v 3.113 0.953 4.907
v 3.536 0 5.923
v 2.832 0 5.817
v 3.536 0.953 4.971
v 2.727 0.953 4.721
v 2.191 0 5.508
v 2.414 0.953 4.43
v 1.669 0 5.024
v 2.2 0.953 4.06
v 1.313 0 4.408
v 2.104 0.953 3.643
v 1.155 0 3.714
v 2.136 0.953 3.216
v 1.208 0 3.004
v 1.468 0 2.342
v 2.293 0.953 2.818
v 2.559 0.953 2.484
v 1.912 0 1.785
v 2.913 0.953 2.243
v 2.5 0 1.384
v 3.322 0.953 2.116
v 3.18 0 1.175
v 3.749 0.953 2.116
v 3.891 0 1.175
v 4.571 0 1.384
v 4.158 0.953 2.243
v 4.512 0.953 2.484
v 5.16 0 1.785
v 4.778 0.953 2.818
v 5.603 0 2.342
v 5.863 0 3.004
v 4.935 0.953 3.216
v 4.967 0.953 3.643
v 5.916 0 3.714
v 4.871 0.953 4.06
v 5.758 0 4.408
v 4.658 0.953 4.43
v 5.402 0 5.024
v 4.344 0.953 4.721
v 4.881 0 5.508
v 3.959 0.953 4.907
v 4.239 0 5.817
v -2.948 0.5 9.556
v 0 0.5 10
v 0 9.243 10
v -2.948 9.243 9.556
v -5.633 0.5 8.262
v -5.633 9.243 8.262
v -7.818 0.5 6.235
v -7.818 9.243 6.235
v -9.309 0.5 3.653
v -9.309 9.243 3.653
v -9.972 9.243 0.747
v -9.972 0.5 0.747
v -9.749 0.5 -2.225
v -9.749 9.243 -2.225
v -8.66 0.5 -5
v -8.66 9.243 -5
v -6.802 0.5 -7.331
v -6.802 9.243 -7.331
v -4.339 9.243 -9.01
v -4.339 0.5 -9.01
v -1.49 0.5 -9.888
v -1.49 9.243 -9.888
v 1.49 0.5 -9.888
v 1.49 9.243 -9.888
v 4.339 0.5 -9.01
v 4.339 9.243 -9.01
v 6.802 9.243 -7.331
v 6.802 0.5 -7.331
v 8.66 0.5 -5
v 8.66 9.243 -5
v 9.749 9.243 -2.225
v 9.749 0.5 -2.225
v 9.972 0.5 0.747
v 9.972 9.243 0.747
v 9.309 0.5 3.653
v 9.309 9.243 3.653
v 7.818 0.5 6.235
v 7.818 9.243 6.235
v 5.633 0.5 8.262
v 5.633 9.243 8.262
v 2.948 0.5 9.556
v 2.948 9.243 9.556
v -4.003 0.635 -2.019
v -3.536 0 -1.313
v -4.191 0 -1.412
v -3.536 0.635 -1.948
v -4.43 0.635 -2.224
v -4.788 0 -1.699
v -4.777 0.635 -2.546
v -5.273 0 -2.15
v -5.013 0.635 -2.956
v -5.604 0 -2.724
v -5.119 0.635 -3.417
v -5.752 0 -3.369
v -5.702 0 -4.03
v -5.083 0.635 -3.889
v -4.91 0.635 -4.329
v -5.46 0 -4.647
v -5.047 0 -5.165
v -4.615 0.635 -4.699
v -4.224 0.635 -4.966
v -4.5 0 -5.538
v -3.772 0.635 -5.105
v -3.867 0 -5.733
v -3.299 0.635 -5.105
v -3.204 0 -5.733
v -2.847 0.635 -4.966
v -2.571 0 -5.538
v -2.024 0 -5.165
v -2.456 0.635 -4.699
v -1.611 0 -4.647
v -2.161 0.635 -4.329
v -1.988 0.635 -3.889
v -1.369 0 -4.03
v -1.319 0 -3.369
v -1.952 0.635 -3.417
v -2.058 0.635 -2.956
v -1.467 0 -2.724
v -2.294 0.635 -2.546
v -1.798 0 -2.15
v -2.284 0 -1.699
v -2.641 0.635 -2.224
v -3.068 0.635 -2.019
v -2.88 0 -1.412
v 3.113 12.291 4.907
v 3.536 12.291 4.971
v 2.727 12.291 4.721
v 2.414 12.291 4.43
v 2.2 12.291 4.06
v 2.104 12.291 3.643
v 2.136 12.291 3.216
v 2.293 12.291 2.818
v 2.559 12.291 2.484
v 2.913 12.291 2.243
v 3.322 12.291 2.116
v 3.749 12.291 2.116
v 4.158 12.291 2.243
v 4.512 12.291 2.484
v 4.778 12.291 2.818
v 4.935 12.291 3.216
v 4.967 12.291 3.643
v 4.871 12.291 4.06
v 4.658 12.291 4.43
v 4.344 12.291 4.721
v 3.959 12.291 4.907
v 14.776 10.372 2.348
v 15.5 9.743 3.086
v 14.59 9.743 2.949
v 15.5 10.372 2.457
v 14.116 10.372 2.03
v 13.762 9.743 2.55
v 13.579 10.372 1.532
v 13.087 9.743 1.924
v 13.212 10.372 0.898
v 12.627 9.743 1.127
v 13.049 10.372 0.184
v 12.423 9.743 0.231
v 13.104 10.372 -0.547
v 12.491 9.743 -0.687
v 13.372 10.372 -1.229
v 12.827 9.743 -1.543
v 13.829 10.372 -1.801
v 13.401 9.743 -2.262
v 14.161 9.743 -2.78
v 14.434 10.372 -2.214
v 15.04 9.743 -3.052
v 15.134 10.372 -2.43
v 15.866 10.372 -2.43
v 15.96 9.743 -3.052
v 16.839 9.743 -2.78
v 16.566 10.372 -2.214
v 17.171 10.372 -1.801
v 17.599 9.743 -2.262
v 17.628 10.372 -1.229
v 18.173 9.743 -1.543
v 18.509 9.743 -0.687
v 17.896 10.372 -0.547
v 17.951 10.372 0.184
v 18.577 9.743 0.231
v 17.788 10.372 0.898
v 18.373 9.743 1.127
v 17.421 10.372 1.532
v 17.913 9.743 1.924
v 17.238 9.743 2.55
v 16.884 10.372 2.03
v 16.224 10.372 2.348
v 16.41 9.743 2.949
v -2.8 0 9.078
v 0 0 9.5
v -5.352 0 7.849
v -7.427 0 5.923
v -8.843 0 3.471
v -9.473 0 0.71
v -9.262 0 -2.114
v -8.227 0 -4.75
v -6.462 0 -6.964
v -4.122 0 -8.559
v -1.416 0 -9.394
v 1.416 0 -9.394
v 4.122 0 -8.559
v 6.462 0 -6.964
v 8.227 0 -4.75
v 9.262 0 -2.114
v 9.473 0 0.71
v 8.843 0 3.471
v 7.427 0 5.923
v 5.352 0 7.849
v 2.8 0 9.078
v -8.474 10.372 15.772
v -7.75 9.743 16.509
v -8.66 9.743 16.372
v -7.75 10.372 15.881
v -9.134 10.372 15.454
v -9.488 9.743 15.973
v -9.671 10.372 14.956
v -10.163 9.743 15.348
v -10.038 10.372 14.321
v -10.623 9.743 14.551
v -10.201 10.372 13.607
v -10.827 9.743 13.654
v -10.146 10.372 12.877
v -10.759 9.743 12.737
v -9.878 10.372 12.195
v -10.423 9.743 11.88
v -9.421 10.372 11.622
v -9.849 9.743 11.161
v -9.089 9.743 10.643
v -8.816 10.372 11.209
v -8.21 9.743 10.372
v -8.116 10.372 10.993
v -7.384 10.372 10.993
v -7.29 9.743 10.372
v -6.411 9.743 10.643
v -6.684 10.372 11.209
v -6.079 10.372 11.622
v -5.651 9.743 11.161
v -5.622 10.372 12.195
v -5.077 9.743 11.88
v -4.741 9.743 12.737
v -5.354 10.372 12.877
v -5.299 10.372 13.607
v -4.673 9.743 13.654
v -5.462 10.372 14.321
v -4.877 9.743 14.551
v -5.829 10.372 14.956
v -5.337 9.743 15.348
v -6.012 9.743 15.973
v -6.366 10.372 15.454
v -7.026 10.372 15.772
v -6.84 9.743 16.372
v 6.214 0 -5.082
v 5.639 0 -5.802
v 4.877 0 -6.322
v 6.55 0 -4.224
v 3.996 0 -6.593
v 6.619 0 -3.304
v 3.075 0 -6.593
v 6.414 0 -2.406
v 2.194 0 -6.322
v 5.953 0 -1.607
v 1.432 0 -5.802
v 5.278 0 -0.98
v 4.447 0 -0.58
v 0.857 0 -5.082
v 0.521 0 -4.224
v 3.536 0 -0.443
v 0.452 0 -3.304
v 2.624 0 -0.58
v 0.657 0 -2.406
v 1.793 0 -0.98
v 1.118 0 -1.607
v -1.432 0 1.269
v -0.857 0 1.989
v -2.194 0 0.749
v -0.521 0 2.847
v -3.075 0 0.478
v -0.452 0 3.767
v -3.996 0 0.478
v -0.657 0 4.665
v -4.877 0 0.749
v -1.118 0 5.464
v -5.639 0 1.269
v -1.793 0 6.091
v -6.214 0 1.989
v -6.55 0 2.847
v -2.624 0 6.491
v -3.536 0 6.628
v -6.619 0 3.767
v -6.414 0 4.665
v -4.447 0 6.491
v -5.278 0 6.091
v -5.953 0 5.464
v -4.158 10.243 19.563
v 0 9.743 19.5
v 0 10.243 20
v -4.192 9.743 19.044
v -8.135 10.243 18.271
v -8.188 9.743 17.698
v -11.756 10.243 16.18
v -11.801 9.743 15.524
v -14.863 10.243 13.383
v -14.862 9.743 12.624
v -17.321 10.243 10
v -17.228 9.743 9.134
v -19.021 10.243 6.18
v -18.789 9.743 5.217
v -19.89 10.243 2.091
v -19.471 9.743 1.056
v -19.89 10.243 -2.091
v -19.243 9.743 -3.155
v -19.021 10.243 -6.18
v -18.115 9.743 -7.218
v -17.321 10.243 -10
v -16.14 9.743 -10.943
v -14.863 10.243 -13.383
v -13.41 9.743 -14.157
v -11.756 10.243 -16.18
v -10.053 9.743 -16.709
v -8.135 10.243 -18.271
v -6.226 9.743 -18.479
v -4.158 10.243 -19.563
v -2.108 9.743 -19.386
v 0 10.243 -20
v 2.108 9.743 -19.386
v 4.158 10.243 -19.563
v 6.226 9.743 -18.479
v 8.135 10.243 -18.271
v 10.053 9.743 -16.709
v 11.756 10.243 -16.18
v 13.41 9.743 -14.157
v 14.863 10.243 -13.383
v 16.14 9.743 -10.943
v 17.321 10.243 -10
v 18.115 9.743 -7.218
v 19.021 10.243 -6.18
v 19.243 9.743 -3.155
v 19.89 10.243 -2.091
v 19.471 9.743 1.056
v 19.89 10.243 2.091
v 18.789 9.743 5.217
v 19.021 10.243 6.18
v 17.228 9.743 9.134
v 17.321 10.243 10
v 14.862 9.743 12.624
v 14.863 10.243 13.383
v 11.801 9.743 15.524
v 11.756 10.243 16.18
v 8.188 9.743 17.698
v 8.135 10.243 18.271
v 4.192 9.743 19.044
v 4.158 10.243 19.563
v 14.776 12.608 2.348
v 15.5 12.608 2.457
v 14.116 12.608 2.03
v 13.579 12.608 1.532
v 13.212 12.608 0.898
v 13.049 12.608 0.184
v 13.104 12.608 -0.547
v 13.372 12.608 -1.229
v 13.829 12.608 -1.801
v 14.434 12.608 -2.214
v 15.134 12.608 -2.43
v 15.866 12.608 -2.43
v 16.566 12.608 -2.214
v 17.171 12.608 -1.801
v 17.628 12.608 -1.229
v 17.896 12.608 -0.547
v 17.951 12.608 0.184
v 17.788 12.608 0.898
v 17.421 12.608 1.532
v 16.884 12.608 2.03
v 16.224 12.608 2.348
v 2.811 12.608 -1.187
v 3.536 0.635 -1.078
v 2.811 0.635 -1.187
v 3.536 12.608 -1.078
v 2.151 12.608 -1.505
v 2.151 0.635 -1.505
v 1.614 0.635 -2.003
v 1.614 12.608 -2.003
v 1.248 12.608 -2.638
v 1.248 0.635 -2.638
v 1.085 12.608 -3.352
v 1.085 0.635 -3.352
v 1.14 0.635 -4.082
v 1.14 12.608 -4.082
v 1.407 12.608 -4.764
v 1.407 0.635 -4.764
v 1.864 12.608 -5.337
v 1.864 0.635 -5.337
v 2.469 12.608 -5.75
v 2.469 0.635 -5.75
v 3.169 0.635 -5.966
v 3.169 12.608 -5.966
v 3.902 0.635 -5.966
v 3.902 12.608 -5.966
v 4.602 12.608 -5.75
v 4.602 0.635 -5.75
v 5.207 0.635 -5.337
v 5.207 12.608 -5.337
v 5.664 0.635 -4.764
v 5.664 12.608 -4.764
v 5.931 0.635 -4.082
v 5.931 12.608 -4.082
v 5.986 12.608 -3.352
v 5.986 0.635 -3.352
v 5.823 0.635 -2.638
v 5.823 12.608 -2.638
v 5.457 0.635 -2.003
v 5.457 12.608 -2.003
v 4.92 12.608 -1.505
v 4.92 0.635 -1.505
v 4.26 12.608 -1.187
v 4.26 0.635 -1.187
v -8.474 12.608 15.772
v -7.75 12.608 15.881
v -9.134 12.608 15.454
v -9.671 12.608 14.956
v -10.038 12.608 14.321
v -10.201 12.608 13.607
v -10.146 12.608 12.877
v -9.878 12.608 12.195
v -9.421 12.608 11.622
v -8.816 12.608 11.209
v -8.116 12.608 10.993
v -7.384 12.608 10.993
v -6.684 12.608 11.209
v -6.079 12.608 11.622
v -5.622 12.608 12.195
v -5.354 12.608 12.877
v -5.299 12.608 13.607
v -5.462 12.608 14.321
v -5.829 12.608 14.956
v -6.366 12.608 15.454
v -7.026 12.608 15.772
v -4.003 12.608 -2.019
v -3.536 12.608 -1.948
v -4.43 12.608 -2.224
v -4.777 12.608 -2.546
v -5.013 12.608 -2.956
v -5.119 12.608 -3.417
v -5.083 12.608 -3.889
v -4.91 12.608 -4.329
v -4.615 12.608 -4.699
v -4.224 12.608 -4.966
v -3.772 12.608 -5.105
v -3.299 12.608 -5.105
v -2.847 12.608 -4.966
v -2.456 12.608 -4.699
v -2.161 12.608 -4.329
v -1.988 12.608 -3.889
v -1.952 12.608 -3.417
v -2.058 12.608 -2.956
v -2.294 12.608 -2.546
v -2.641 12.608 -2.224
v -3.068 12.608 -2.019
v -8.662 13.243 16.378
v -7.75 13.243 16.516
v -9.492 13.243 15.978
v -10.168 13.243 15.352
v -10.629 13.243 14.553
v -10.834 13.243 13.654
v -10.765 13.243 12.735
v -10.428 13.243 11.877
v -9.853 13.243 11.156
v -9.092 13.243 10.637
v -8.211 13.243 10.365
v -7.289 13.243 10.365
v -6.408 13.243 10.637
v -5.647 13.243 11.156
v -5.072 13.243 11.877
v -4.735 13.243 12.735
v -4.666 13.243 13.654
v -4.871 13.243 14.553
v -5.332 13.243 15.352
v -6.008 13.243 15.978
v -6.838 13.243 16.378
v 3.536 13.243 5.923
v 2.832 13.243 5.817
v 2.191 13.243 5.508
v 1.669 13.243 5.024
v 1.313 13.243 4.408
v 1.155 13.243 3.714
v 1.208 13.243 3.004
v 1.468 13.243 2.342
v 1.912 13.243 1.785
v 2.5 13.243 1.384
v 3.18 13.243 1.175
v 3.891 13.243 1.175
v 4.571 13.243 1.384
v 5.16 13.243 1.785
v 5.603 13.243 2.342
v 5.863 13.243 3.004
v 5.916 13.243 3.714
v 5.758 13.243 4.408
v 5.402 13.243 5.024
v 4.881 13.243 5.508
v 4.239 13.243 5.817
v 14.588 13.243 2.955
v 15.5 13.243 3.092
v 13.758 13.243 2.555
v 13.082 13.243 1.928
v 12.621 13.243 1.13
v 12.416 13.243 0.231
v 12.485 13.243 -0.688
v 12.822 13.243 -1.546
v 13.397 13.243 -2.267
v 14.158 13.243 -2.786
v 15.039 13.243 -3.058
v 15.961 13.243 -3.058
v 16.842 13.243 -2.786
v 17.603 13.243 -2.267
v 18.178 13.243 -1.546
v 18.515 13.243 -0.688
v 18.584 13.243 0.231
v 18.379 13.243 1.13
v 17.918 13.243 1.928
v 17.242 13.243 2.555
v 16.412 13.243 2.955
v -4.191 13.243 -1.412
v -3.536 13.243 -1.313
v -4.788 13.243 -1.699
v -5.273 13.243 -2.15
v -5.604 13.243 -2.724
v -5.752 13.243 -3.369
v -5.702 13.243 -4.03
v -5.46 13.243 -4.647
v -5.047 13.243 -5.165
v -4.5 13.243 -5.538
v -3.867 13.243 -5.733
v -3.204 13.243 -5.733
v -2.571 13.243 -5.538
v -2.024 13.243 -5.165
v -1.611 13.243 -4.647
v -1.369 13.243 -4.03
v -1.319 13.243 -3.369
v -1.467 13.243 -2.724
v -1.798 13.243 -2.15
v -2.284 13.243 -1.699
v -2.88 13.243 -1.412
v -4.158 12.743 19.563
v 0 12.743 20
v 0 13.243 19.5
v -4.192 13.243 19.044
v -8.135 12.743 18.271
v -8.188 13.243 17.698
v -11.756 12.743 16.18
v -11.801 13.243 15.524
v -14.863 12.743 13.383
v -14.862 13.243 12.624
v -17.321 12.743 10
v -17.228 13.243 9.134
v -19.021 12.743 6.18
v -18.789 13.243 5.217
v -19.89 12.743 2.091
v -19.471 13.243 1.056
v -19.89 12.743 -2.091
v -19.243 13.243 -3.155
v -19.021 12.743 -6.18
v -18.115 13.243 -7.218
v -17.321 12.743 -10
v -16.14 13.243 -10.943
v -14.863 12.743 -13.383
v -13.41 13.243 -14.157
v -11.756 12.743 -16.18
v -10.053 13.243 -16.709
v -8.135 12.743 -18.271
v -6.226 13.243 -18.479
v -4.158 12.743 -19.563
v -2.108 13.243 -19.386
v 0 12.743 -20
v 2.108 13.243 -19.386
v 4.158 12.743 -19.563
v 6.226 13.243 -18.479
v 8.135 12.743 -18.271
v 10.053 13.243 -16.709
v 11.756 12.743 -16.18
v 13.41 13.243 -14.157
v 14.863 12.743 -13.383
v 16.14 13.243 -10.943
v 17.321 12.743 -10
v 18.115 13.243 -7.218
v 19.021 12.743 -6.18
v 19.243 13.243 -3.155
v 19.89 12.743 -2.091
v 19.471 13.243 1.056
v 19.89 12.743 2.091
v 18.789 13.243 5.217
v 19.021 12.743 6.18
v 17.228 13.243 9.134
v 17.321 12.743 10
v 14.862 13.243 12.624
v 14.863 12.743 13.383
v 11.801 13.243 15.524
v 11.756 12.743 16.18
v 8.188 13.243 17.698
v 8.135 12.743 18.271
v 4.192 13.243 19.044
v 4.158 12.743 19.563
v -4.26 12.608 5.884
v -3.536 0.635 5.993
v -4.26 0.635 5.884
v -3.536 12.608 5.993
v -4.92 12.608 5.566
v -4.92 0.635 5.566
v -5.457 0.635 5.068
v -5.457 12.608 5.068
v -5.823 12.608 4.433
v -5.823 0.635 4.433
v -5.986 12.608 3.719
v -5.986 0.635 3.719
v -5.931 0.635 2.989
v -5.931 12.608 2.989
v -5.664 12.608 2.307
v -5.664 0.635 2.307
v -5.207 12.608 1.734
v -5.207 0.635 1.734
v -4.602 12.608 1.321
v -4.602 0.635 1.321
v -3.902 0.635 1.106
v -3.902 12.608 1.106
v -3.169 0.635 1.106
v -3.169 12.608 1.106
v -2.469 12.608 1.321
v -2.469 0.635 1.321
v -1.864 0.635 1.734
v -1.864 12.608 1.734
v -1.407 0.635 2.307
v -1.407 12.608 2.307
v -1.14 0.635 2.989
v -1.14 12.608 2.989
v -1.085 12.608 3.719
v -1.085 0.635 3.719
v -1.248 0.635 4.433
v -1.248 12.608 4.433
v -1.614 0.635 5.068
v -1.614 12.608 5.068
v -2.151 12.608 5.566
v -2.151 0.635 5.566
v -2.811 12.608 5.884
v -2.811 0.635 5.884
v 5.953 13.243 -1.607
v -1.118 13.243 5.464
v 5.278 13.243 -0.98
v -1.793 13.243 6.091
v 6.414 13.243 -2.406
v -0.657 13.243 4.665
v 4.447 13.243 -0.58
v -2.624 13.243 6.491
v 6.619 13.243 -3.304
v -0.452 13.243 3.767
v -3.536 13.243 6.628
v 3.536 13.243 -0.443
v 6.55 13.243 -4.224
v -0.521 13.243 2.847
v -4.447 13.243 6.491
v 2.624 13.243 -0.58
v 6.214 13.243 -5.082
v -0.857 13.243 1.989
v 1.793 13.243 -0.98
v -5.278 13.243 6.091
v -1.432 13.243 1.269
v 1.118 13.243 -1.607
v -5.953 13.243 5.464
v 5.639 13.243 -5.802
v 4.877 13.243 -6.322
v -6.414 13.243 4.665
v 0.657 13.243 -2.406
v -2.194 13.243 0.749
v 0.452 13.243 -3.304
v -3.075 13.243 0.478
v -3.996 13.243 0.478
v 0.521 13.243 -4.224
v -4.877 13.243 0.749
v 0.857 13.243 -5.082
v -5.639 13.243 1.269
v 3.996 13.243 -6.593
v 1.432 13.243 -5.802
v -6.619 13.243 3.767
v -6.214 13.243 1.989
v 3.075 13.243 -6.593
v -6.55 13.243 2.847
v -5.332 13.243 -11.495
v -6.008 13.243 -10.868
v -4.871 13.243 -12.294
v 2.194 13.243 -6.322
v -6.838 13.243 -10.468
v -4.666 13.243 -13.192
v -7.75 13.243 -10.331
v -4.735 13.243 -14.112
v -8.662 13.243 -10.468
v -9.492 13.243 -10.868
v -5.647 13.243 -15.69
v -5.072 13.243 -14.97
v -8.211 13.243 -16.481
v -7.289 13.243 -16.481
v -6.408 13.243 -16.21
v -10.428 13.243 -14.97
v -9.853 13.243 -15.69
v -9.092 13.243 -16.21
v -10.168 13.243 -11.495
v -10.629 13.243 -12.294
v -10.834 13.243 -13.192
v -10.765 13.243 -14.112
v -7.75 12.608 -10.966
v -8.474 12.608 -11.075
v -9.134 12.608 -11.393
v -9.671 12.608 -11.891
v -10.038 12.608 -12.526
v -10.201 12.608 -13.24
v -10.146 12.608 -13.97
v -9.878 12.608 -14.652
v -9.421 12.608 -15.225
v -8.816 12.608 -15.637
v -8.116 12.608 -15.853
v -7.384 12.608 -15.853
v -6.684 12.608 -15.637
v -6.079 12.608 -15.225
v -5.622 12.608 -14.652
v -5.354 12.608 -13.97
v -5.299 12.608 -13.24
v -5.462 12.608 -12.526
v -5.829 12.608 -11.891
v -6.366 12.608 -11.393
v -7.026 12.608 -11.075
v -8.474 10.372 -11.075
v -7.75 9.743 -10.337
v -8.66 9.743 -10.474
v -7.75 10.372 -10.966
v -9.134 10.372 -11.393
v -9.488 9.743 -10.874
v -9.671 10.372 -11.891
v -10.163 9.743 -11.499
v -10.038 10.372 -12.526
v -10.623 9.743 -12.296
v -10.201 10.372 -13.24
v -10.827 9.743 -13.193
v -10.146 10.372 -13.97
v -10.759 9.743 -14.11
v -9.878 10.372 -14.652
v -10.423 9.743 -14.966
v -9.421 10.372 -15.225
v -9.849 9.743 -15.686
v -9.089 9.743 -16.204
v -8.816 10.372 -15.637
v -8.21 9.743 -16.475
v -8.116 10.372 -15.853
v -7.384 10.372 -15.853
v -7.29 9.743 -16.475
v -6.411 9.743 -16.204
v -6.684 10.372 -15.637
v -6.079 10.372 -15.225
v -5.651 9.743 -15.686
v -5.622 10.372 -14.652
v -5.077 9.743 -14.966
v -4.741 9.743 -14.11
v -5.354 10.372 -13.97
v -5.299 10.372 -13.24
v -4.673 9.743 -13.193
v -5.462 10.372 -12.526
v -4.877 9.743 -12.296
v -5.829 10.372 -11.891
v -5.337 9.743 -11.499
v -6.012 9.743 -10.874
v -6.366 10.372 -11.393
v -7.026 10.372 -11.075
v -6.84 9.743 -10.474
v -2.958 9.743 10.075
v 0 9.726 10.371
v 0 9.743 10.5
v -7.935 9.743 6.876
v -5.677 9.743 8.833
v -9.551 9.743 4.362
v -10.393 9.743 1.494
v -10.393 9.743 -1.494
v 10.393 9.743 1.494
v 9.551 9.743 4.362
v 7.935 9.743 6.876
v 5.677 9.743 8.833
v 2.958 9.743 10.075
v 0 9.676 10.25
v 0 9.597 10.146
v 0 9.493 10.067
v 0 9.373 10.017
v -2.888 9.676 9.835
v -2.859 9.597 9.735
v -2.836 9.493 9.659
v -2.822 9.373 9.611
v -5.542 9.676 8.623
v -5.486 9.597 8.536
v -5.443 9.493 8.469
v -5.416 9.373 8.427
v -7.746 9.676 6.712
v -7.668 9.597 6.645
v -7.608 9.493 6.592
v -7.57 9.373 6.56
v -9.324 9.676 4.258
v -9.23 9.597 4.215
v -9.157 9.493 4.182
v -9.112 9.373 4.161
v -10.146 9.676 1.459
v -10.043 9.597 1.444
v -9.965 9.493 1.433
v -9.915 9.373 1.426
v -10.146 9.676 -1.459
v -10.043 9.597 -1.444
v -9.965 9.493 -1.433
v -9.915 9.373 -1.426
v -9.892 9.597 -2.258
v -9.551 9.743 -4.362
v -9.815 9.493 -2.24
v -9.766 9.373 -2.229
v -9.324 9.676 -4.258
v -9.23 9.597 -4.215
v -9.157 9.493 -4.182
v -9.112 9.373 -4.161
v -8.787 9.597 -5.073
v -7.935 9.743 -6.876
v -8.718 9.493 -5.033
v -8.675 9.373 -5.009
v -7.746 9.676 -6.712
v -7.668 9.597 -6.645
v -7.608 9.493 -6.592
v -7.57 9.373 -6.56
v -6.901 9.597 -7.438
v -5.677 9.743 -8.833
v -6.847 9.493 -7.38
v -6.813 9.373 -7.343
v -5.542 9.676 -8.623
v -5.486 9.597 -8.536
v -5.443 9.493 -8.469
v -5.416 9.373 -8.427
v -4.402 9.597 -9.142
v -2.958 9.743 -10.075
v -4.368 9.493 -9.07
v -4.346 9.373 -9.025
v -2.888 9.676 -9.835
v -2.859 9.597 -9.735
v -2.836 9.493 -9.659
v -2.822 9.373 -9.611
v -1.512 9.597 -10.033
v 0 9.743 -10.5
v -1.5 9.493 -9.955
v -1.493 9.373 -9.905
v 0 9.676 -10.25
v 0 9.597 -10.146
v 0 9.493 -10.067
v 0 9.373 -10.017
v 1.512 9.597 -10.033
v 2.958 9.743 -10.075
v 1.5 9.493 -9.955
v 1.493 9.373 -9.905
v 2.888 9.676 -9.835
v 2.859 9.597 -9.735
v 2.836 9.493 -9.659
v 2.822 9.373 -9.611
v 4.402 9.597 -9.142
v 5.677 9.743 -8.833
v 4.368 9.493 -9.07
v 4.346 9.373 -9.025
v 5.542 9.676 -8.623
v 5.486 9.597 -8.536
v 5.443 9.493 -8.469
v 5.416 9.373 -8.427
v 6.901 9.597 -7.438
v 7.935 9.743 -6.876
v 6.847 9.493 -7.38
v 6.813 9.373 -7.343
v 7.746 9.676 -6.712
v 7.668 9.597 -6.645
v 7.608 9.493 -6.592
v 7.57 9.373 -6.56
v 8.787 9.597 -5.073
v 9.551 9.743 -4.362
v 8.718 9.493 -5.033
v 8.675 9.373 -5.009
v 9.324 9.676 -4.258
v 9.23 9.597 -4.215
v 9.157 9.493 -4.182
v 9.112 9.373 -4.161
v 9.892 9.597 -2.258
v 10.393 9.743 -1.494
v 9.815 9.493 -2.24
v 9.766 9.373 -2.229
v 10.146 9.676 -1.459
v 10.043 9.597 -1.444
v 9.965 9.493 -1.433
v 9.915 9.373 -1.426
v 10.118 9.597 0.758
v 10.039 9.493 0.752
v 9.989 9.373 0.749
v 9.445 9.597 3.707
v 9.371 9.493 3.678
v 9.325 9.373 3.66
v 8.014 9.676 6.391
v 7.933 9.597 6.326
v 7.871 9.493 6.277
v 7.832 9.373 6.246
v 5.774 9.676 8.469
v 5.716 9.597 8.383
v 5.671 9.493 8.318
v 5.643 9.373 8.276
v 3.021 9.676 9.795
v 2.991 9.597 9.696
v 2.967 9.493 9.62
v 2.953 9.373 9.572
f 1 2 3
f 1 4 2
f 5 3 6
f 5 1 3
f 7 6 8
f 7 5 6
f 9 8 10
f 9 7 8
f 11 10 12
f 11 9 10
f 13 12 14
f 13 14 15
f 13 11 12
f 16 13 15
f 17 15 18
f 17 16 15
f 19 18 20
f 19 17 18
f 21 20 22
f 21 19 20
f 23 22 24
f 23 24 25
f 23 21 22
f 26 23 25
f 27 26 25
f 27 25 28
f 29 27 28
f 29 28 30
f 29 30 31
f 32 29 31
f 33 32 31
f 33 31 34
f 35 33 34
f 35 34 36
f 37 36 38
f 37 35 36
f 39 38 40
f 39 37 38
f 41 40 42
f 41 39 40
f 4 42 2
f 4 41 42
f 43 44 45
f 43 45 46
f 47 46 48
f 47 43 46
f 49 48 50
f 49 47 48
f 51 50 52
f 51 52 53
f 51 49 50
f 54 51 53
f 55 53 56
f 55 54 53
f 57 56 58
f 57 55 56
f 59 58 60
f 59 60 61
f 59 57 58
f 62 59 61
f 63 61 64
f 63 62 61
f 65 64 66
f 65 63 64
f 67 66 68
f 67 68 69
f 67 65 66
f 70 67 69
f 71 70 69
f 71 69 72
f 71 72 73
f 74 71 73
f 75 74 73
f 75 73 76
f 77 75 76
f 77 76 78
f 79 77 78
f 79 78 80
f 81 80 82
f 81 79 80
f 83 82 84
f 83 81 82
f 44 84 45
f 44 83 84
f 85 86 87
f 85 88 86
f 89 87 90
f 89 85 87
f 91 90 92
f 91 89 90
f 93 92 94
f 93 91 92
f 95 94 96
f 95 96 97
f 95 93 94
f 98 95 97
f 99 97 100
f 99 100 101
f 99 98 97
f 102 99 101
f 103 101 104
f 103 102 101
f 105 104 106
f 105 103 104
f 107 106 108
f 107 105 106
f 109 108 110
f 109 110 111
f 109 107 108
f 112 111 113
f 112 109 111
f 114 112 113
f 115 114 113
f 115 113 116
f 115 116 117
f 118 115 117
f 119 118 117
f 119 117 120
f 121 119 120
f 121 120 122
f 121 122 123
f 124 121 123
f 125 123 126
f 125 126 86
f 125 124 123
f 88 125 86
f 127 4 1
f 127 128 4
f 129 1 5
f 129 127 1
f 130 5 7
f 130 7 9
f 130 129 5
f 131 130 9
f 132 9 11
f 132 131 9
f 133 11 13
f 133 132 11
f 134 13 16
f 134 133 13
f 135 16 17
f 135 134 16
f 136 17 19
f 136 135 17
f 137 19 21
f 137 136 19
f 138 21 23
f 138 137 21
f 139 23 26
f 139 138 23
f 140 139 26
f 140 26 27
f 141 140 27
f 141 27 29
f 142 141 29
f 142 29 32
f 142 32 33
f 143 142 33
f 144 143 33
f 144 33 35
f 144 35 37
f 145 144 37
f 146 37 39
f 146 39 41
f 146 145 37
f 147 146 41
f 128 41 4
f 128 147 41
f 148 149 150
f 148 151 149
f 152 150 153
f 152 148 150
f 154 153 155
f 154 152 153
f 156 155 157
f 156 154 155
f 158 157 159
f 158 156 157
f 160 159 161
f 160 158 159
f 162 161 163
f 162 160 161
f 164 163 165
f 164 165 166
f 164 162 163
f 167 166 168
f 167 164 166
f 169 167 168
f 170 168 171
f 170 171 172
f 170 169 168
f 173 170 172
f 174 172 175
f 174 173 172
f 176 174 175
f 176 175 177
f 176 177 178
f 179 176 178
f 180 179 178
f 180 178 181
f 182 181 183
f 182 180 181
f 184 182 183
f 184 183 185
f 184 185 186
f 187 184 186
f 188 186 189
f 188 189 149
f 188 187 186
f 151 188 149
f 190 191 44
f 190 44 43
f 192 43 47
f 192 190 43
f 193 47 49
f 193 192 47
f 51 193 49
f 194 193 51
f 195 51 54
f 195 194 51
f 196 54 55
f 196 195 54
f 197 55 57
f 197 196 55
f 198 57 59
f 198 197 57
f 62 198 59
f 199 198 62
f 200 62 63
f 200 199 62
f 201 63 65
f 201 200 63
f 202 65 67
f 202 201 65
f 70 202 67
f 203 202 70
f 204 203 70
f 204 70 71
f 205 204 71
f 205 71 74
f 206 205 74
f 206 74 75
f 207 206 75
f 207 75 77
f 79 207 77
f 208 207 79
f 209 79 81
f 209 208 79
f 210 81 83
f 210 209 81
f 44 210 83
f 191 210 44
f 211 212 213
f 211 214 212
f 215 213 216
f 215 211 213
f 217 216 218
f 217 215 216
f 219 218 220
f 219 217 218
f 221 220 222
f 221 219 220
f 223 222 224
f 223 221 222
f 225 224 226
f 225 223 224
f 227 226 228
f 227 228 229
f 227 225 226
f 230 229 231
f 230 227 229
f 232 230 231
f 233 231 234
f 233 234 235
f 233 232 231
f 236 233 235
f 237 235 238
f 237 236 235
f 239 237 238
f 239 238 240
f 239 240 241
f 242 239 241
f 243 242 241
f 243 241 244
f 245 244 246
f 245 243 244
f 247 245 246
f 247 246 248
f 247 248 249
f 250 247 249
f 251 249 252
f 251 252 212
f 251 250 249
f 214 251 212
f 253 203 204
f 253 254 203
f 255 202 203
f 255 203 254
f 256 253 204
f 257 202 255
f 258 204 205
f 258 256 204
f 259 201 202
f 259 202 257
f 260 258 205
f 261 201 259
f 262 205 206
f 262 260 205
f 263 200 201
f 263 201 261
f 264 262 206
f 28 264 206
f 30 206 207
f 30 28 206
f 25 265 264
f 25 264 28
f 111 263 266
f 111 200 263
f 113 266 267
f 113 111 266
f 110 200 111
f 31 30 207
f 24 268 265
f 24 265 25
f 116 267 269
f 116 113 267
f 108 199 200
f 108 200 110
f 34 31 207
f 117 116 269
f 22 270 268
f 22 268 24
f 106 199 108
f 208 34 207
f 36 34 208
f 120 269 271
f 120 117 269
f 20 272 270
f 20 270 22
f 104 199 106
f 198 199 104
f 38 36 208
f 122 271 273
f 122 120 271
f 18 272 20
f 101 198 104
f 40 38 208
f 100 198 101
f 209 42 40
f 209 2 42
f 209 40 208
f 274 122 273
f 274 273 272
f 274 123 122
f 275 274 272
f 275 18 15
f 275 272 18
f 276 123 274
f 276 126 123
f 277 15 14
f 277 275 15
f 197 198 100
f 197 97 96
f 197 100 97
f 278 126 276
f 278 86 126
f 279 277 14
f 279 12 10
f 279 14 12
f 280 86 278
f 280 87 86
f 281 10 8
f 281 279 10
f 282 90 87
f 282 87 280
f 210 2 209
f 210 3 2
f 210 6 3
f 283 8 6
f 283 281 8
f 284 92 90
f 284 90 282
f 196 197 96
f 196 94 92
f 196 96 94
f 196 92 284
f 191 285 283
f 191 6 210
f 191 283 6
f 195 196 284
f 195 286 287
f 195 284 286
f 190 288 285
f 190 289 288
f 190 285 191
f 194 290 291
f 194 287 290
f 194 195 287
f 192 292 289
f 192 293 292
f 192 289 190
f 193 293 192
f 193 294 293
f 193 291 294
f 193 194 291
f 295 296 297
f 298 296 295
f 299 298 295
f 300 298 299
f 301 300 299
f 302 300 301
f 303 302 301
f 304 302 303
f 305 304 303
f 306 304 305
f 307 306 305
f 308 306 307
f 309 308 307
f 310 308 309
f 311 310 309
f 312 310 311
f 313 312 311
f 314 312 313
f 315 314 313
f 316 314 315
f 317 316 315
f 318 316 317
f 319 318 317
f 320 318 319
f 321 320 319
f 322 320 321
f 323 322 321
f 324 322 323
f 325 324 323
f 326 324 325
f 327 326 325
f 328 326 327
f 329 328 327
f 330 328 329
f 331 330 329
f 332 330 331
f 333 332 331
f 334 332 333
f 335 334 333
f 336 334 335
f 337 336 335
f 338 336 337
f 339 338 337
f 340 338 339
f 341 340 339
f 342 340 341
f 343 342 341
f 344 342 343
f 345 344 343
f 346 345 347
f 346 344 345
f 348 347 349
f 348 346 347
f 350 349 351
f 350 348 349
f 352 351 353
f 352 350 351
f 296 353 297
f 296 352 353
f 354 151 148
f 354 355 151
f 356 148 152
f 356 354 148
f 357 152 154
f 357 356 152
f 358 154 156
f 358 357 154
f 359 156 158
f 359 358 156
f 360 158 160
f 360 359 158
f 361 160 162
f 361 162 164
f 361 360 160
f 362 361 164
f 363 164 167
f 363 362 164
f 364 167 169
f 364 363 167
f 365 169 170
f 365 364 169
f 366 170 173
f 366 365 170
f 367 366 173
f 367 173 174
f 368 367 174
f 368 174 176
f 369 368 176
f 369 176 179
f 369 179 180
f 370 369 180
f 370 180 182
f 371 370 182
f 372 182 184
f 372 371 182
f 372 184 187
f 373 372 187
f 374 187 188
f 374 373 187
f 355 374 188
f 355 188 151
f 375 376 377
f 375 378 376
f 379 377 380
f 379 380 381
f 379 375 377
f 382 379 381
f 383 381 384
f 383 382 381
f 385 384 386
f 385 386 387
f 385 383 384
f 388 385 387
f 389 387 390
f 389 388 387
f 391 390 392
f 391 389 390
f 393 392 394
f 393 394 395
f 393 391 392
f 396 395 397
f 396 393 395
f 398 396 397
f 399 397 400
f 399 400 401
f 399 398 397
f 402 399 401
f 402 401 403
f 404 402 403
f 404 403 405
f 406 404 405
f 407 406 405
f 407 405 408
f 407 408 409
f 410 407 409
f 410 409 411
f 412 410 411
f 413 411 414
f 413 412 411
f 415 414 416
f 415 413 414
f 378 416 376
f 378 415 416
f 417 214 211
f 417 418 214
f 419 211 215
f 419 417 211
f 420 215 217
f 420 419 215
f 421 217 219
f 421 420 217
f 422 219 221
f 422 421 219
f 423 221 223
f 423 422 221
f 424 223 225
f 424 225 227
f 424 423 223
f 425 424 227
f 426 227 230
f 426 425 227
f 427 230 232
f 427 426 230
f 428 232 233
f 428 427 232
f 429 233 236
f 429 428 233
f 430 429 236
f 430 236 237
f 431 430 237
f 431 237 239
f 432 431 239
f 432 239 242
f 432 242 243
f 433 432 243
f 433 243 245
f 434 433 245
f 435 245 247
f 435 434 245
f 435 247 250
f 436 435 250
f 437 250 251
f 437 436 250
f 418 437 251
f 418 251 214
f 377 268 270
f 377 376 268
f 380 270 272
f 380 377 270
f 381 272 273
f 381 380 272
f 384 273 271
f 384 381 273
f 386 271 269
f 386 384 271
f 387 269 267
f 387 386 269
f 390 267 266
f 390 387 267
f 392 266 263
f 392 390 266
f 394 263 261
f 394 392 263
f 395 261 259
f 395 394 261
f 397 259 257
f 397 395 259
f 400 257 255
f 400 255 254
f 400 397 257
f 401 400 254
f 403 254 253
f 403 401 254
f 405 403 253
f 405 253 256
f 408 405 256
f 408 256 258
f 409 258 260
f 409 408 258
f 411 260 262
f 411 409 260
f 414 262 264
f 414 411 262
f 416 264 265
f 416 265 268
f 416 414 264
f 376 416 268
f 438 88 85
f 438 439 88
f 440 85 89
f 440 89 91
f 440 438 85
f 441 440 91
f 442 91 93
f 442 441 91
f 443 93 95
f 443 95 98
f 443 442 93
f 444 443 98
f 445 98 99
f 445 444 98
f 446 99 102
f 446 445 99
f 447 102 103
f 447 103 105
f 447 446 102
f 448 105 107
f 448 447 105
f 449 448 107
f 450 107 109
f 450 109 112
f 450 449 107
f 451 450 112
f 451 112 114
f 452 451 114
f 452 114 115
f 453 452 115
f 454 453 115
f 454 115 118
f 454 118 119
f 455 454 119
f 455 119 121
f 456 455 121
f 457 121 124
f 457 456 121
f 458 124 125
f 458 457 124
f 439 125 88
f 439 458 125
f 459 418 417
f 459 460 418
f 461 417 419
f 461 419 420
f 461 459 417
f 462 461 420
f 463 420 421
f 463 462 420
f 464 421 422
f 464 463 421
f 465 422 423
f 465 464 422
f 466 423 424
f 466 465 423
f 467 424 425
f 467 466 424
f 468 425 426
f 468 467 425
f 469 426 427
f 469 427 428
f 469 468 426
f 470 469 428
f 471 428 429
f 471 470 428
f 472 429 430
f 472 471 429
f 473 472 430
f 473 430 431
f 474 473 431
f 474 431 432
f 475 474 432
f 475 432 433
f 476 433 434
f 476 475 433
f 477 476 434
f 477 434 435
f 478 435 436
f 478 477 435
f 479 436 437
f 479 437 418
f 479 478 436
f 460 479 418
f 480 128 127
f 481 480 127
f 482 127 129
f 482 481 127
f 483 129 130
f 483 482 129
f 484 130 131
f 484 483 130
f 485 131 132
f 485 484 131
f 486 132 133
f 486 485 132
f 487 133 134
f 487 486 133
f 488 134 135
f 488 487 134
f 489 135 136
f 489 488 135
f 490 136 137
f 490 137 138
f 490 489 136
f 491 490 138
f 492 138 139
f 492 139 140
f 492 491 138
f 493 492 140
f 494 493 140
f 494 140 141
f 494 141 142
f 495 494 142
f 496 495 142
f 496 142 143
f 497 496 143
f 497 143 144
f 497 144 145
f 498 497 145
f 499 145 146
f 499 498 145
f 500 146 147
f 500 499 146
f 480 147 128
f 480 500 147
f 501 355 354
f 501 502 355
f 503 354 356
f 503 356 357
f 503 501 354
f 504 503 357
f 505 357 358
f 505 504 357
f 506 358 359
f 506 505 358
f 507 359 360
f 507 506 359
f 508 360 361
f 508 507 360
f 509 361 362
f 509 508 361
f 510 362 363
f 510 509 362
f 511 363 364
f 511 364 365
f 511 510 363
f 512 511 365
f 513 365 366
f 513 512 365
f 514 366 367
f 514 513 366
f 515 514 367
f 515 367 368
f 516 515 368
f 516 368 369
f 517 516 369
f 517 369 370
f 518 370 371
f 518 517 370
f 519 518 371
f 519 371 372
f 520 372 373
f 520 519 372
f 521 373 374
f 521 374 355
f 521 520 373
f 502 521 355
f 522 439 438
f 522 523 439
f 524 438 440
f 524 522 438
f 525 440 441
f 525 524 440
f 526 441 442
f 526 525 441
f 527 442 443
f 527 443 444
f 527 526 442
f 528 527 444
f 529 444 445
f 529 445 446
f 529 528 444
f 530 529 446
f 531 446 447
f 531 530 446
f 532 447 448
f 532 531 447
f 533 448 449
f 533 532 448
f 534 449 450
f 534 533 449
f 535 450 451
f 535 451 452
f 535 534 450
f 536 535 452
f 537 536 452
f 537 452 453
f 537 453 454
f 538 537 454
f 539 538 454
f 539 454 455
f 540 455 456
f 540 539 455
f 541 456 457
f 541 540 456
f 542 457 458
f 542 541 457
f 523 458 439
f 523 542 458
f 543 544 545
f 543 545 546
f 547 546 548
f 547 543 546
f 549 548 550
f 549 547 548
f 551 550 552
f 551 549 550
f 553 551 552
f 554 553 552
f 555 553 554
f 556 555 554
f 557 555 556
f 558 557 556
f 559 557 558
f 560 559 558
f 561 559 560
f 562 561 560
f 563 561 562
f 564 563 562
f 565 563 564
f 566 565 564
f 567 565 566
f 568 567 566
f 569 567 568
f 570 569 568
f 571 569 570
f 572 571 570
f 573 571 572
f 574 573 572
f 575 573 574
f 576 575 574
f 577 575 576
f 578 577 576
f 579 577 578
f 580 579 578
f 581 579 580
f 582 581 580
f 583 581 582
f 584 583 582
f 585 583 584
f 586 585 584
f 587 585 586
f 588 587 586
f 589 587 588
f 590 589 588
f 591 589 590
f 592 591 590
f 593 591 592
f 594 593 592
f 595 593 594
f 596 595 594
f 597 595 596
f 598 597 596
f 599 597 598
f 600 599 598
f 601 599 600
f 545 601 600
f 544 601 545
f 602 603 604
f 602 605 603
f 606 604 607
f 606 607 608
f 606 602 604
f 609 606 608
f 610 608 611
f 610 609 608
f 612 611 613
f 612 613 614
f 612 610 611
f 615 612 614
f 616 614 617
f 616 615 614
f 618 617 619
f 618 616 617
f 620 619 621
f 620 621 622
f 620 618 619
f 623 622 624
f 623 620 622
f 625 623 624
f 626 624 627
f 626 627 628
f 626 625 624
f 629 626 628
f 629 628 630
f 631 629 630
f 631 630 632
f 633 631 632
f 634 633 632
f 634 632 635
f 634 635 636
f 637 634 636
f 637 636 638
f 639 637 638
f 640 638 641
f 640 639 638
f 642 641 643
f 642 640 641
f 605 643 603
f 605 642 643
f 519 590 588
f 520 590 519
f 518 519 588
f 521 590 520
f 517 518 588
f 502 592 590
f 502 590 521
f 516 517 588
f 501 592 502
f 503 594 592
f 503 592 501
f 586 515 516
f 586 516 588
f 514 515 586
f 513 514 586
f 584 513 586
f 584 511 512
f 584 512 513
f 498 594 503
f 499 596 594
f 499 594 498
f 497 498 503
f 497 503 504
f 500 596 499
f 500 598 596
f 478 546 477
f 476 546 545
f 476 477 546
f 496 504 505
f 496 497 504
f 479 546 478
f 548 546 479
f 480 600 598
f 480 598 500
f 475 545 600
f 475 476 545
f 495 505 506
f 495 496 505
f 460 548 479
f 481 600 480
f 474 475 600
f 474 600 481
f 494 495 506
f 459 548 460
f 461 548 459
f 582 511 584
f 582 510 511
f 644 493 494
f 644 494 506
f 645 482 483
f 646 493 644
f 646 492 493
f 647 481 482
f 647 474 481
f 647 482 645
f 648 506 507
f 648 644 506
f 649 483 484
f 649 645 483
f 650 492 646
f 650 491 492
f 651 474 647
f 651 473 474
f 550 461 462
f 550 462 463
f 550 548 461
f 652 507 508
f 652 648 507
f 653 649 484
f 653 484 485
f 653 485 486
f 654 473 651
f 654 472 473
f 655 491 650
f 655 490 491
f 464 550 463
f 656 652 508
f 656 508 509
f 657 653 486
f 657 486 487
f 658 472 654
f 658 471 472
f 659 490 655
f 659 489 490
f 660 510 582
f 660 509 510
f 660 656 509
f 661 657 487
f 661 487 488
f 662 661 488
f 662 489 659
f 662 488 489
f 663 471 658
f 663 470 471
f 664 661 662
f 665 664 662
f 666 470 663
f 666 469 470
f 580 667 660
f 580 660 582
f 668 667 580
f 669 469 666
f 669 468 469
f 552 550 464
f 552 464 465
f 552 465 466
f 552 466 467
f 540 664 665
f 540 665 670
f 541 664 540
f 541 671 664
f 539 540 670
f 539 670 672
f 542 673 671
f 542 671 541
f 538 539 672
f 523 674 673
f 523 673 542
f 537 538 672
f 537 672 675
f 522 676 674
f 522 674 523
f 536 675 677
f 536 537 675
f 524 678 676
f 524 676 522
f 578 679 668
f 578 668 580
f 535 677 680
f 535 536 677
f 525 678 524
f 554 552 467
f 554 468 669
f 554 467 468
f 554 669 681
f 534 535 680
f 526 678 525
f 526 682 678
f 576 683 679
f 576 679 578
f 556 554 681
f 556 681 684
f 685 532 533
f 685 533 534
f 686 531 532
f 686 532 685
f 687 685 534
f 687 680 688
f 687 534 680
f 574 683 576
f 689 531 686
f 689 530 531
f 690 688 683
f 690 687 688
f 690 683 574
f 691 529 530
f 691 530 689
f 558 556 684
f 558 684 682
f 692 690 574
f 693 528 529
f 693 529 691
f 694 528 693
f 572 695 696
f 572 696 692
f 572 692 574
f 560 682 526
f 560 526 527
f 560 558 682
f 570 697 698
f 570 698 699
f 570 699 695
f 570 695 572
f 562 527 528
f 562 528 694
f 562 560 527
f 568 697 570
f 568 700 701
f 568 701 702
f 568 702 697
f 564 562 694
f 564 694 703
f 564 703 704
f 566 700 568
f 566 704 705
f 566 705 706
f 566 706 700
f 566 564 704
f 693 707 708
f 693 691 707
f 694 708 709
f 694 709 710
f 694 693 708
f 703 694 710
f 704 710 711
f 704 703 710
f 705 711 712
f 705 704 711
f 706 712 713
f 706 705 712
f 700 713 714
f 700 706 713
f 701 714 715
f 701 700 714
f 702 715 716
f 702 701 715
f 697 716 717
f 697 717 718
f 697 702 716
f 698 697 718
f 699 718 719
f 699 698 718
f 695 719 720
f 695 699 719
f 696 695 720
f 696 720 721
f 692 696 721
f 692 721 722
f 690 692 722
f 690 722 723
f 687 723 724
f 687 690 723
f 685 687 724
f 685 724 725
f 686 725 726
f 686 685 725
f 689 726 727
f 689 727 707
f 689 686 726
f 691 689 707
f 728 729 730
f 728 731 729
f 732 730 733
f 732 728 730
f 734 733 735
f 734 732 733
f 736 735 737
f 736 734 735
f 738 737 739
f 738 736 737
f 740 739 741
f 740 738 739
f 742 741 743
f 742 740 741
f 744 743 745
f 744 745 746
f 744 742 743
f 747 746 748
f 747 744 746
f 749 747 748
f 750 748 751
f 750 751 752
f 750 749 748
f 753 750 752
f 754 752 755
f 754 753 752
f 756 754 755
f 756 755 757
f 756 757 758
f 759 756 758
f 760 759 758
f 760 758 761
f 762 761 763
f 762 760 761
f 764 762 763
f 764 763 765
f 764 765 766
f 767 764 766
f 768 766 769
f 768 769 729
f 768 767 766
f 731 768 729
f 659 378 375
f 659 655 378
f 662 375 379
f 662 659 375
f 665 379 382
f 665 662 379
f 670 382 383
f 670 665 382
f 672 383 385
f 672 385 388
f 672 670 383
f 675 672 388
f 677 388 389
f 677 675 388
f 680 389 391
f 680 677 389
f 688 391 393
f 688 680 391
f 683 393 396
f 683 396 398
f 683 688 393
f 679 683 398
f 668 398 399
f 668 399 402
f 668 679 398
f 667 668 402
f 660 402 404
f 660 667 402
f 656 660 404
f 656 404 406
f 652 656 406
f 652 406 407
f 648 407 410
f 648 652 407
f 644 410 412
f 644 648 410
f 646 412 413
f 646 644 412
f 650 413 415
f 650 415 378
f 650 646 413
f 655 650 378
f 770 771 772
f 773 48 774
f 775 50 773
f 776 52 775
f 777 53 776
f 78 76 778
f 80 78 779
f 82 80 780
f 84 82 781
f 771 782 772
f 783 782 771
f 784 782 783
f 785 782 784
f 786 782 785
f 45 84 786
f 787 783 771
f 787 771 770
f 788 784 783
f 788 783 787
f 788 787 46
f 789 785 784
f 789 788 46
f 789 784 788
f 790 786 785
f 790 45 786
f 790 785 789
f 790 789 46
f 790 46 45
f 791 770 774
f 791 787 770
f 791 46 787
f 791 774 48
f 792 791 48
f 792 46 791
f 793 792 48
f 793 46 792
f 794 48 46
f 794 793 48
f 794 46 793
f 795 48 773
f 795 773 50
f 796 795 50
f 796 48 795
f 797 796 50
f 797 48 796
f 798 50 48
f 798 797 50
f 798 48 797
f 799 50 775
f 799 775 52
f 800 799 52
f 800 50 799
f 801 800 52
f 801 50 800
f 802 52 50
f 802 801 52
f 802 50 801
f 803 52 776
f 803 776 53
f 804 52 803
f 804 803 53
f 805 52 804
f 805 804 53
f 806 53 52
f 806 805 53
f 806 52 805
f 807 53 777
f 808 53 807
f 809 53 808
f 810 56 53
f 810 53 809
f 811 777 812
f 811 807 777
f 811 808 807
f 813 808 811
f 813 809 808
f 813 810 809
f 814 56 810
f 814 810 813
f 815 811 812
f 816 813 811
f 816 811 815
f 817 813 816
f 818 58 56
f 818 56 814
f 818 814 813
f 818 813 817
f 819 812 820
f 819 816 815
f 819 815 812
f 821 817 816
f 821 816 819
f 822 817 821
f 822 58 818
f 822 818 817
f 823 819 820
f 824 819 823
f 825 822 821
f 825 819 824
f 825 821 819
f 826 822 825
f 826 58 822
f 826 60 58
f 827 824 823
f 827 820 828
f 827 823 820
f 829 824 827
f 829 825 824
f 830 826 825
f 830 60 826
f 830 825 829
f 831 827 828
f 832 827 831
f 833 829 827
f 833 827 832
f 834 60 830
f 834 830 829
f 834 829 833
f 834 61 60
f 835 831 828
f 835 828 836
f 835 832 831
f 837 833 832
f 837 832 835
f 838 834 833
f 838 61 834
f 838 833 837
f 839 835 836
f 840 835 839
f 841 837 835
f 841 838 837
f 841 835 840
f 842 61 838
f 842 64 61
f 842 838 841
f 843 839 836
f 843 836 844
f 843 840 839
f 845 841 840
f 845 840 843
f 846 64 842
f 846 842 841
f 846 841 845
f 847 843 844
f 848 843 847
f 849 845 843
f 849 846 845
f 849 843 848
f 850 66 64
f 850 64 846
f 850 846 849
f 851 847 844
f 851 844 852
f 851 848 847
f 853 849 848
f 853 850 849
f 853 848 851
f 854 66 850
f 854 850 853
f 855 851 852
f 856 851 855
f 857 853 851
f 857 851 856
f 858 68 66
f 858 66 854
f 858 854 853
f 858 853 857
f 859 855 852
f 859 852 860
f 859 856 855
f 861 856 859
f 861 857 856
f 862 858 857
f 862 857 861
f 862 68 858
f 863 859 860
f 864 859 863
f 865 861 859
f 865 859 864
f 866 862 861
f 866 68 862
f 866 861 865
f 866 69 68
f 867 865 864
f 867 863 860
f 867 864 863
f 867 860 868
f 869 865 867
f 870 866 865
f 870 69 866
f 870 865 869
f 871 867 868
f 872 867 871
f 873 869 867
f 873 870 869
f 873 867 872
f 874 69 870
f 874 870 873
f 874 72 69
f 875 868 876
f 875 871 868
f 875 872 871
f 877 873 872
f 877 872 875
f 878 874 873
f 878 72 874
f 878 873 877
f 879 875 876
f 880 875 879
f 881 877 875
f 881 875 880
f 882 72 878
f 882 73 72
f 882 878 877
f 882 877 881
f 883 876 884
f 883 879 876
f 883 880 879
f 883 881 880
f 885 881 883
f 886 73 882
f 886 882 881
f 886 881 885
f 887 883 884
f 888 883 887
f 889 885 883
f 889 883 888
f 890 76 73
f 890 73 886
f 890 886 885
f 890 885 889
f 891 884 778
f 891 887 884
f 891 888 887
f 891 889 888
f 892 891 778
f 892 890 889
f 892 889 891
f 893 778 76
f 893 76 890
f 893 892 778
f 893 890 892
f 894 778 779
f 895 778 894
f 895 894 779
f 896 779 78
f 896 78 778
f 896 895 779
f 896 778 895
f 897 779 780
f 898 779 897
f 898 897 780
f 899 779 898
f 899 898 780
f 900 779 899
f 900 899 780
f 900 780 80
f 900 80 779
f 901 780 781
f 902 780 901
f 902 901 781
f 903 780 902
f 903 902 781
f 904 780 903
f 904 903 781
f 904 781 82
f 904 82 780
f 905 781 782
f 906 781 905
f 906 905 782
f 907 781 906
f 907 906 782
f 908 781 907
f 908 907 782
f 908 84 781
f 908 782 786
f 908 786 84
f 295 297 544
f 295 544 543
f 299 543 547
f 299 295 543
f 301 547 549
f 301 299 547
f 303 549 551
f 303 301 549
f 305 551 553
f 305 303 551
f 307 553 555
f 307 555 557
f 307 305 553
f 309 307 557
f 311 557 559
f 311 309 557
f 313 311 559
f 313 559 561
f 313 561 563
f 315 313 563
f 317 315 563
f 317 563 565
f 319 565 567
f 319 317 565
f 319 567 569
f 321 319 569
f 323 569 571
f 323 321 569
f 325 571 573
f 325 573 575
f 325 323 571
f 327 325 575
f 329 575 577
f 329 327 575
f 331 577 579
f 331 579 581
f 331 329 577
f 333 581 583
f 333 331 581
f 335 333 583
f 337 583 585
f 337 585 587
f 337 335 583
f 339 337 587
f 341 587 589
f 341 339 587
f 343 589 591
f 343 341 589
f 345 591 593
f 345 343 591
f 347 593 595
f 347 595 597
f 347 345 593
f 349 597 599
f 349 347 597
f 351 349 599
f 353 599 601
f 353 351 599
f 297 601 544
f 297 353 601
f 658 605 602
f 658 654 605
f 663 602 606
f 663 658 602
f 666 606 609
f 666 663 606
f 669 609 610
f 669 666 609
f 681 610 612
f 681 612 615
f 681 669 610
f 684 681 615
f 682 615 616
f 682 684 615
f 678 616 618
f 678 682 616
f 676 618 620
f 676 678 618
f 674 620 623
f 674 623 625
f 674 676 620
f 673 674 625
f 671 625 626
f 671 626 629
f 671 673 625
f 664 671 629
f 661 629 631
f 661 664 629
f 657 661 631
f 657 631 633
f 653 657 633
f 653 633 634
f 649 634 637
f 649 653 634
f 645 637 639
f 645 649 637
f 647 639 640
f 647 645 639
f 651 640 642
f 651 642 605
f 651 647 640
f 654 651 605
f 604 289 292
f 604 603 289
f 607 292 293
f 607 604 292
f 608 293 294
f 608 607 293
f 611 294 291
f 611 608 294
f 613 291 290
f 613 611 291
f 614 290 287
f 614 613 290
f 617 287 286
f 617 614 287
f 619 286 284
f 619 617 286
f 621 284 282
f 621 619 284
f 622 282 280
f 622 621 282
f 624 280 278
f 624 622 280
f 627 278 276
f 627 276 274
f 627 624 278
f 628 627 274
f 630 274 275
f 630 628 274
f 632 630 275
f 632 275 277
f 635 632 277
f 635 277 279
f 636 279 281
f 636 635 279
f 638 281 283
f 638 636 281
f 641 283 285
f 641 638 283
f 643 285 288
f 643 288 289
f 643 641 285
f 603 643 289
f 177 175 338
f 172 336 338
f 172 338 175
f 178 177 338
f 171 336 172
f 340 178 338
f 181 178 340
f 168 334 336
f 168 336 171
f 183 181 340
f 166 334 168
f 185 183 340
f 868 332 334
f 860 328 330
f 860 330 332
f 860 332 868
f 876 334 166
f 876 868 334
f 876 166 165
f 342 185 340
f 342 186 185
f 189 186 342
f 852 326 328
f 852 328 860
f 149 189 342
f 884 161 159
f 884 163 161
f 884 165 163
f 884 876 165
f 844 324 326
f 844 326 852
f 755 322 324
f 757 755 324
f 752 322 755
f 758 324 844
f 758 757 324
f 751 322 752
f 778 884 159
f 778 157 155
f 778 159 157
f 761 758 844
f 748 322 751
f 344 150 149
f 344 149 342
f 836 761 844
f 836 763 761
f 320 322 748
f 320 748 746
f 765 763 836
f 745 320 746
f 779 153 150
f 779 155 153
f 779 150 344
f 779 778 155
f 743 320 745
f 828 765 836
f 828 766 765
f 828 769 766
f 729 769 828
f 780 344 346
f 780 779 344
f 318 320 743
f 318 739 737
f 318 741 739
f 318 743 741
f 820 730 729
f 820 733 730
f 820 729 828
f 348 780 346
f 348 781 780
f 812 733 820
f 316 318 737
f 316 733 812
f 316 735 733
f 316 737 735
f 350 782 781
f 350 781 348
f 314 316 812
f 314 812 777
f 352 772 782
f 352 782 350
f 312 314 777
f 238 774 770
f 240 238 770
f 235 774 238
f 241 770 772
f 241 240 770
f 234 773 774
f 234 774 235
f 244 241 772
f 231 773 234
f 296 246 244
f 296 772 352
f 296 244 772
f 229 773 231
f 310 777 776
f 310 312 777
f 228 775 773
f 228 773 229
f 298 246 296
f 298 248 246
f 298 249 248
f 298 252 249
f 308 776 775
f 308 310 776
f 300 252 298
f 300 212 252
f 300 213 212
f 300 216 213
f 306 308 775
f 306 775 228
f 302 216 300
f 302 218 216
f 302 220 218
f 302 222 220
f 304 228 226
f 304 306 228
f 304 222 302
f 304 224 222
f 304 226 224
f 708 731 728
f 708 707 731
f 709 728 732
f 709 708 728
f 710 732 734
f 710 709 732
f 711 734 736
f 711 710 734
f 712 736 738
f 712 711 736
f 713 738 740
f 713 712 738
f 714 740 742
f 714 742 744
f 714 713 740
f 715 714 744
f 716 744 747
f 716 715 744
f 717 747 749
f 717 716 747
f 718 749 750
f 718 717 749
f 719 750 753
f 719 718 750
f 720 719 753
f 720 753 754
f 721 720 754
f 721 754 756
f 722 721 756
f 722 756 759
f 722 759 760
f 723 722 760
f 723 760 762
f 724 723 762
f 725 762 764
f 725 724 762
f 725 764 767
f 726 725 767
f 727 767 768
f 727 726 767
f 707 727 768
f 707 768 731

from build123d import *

# Parameters (mm, degrees)
F_8_CLEARANCE_HOLE2_AT_2_COUNT = 2
F_8_CLEARANCE_HOLE2_AT_2_PITCH = 10
F_8_CLEARANCE_HOLE1_AT_2_COUNT = 2
F_8_CLEARANCE_HOLE1_AT_2_PITCH = 26.846787517
F_8_CLEARANCE_HOLE1_AT_3_COUNT = 2
F_8_CLEARANCE_HOLE1_AT_3_PITCH = 26.846787517
CHAMFER1_SIZE                  = 0.5
FILLET1_R                      = 0.5


with BuildPart() as part:
    # Sketch1 → Revolve1 (revolve)
    with BuildSketch(Plane(origin=(0, 0, 0), x_dir=(0, 0, -1), z_dir=(1, 0, 0)), mode=Mode.PRIVATE) as revolve1_sk:
        Polygon((0, 0), (0, 13.2432806), (20, 13.2432806), (20, 9.7432806), (10, 9.7432806), (10, 0), align=None)
    revolve(revolve1_sk.sketch.rotate(Axis((0, 0, 0), (0, -1, 0)), 180), axis=Axis((0, 0, 0), (0, -1, 0)))  # turned: the seam where the file's is

    # Sketch4 → #8 Clearance Hole2 (revolve, cut)
    with BuildSketch(Plane(origin=(3.535533906, 13.2432806, -3.535533906), x_dir=(0, 0, 1), z_dir=(1, 0, 0))):
        Polygon((0, 0), (0, 13.2432806), (3.09245, 13.2432806), (2.45745, 12.6082806), (2.45745, 0.635), (3.09245, 0), align=None)
    f_8_clearance_hole2 = revolve(axis=Axis((3.535533906, 19.5932806, -3.535533906), (0, -1, 0)), mode=Mode.SUBTRACT)

    # #8 Clearance Hole2 at 2: #8 Clearance Hole2 ×2
    with Locations(*[Vector(-0.707106781, 0, 0.707106781) * (i * F_8_CLEARANCE_HOLE2_AT_2_PITCH) for i in range(1, F_8_CLEARANCE_HOLE2_AT_2_COUNT)]):
        add(f_8_clearance_hole2, mode=Mode.SUBTRACT)

    # Sketch5 → 1/8 (0.125) Diameter Hole1 (revolve, cut)
    with BuildSketch(Plane(origin=(-3.535533906, 13.2432806, -3.535533906), x_dir=(0, 0, 1), z_dir=(1, 0, 0))):
        Polygon((0, 0), (0, 13.2432806), (2.2225, 13.2432806), (1.5875, 12.6082806), (1.5875, 0.635), (2.2225, 0), align=None)
    revolve(axis=Axis((-3.535533906, 19.5932806, -3.535533906), (0, -1, 0)), mode=Mode.SUBTRACT)

    # Sketch8 → #8 Clearance Hole1 (revolve, cut)
    with BuildSketch(Plane(origin=(-7.75, 13.2432806, -13.423393759), x_dir=(0, 0, 1), z_dir=(1, 0, 0))):
        Polygon((0, 0), (0, 3.5), (3.0861, 3.5), (2.45745, 2.87135), (2.45745, 0.635), (3.09245, 0), align=None)
    f_8_clearance_hole1 = revolve(axis=Axis((-7.75, 19.5932806, -13.423393759), (0, -1, 0)), mode=Mode.SUBTRACT)

    # #8 Clearance Hole1 at 2: #8 Clearance Hole1 ×2
    with Locations(*[Vector(0.866025404, 0, 0.5) * (i * F_8_CLEARANCE_HOLE1_AT_2_PITCH) for i in range(1, F_8_CLEARANCE_HOLE1_AT_2_COUNT)]):
        add(f_8_clearance_hole1, mode=Mode.SUBTRACT)

    # #8 Clearance Hole1 at 3: #8 Clearance Hole1 ×2
    with Locations(*[(0, 0, i * F_8_CLEARANCE_HOLE1_AT_3_PITCH) for i in range(1, F_8_CLEARANCE_HOLE1_AT_3_COUNT)]):
        add(f_8_clearance_hole1, mode=Mode.SUBTRACT)

    # Sketch10 → #6-40 Tapped Hole1 (revolve, cut)
    with BuildSketch(Plane(origin=(3.535533906, 13.2432806, 3.535533906), x_dir=(0, 0, 1), z_dir=(1, 0, 0))):
        Polygon((0, 0), (0, 13.2432806), (2.3876, 13.2432806), (1.4351, 12.2907806), (1.4351, 0.9525), (2.3876, 0), align=None)
    revolve(axis=Axis((3.535533906, 19.5932806, 3.535533906), (0, -1, 0)), mode=Mode.SUBTRACT)

    # Chamfer1
    chamfer1_edges = [part.edges().sort_by_distance(p)[0] for p in [
        (0, 0, -10),
        (0, 9.7432806, -20),
        (0, 13.2432806, -20),
    ]]
    chamfer(chamfer1_edges, length=CHAMFER1_SIZE)

    # Fillet1
    fillet1_edges = [part.edges().sort_by_distance(p)[0] for p in [
        (0, 9.7432806, -10),
    ]]
    fillet(fillet1_edges, radius=FILLET1_R)


solid = part.part
